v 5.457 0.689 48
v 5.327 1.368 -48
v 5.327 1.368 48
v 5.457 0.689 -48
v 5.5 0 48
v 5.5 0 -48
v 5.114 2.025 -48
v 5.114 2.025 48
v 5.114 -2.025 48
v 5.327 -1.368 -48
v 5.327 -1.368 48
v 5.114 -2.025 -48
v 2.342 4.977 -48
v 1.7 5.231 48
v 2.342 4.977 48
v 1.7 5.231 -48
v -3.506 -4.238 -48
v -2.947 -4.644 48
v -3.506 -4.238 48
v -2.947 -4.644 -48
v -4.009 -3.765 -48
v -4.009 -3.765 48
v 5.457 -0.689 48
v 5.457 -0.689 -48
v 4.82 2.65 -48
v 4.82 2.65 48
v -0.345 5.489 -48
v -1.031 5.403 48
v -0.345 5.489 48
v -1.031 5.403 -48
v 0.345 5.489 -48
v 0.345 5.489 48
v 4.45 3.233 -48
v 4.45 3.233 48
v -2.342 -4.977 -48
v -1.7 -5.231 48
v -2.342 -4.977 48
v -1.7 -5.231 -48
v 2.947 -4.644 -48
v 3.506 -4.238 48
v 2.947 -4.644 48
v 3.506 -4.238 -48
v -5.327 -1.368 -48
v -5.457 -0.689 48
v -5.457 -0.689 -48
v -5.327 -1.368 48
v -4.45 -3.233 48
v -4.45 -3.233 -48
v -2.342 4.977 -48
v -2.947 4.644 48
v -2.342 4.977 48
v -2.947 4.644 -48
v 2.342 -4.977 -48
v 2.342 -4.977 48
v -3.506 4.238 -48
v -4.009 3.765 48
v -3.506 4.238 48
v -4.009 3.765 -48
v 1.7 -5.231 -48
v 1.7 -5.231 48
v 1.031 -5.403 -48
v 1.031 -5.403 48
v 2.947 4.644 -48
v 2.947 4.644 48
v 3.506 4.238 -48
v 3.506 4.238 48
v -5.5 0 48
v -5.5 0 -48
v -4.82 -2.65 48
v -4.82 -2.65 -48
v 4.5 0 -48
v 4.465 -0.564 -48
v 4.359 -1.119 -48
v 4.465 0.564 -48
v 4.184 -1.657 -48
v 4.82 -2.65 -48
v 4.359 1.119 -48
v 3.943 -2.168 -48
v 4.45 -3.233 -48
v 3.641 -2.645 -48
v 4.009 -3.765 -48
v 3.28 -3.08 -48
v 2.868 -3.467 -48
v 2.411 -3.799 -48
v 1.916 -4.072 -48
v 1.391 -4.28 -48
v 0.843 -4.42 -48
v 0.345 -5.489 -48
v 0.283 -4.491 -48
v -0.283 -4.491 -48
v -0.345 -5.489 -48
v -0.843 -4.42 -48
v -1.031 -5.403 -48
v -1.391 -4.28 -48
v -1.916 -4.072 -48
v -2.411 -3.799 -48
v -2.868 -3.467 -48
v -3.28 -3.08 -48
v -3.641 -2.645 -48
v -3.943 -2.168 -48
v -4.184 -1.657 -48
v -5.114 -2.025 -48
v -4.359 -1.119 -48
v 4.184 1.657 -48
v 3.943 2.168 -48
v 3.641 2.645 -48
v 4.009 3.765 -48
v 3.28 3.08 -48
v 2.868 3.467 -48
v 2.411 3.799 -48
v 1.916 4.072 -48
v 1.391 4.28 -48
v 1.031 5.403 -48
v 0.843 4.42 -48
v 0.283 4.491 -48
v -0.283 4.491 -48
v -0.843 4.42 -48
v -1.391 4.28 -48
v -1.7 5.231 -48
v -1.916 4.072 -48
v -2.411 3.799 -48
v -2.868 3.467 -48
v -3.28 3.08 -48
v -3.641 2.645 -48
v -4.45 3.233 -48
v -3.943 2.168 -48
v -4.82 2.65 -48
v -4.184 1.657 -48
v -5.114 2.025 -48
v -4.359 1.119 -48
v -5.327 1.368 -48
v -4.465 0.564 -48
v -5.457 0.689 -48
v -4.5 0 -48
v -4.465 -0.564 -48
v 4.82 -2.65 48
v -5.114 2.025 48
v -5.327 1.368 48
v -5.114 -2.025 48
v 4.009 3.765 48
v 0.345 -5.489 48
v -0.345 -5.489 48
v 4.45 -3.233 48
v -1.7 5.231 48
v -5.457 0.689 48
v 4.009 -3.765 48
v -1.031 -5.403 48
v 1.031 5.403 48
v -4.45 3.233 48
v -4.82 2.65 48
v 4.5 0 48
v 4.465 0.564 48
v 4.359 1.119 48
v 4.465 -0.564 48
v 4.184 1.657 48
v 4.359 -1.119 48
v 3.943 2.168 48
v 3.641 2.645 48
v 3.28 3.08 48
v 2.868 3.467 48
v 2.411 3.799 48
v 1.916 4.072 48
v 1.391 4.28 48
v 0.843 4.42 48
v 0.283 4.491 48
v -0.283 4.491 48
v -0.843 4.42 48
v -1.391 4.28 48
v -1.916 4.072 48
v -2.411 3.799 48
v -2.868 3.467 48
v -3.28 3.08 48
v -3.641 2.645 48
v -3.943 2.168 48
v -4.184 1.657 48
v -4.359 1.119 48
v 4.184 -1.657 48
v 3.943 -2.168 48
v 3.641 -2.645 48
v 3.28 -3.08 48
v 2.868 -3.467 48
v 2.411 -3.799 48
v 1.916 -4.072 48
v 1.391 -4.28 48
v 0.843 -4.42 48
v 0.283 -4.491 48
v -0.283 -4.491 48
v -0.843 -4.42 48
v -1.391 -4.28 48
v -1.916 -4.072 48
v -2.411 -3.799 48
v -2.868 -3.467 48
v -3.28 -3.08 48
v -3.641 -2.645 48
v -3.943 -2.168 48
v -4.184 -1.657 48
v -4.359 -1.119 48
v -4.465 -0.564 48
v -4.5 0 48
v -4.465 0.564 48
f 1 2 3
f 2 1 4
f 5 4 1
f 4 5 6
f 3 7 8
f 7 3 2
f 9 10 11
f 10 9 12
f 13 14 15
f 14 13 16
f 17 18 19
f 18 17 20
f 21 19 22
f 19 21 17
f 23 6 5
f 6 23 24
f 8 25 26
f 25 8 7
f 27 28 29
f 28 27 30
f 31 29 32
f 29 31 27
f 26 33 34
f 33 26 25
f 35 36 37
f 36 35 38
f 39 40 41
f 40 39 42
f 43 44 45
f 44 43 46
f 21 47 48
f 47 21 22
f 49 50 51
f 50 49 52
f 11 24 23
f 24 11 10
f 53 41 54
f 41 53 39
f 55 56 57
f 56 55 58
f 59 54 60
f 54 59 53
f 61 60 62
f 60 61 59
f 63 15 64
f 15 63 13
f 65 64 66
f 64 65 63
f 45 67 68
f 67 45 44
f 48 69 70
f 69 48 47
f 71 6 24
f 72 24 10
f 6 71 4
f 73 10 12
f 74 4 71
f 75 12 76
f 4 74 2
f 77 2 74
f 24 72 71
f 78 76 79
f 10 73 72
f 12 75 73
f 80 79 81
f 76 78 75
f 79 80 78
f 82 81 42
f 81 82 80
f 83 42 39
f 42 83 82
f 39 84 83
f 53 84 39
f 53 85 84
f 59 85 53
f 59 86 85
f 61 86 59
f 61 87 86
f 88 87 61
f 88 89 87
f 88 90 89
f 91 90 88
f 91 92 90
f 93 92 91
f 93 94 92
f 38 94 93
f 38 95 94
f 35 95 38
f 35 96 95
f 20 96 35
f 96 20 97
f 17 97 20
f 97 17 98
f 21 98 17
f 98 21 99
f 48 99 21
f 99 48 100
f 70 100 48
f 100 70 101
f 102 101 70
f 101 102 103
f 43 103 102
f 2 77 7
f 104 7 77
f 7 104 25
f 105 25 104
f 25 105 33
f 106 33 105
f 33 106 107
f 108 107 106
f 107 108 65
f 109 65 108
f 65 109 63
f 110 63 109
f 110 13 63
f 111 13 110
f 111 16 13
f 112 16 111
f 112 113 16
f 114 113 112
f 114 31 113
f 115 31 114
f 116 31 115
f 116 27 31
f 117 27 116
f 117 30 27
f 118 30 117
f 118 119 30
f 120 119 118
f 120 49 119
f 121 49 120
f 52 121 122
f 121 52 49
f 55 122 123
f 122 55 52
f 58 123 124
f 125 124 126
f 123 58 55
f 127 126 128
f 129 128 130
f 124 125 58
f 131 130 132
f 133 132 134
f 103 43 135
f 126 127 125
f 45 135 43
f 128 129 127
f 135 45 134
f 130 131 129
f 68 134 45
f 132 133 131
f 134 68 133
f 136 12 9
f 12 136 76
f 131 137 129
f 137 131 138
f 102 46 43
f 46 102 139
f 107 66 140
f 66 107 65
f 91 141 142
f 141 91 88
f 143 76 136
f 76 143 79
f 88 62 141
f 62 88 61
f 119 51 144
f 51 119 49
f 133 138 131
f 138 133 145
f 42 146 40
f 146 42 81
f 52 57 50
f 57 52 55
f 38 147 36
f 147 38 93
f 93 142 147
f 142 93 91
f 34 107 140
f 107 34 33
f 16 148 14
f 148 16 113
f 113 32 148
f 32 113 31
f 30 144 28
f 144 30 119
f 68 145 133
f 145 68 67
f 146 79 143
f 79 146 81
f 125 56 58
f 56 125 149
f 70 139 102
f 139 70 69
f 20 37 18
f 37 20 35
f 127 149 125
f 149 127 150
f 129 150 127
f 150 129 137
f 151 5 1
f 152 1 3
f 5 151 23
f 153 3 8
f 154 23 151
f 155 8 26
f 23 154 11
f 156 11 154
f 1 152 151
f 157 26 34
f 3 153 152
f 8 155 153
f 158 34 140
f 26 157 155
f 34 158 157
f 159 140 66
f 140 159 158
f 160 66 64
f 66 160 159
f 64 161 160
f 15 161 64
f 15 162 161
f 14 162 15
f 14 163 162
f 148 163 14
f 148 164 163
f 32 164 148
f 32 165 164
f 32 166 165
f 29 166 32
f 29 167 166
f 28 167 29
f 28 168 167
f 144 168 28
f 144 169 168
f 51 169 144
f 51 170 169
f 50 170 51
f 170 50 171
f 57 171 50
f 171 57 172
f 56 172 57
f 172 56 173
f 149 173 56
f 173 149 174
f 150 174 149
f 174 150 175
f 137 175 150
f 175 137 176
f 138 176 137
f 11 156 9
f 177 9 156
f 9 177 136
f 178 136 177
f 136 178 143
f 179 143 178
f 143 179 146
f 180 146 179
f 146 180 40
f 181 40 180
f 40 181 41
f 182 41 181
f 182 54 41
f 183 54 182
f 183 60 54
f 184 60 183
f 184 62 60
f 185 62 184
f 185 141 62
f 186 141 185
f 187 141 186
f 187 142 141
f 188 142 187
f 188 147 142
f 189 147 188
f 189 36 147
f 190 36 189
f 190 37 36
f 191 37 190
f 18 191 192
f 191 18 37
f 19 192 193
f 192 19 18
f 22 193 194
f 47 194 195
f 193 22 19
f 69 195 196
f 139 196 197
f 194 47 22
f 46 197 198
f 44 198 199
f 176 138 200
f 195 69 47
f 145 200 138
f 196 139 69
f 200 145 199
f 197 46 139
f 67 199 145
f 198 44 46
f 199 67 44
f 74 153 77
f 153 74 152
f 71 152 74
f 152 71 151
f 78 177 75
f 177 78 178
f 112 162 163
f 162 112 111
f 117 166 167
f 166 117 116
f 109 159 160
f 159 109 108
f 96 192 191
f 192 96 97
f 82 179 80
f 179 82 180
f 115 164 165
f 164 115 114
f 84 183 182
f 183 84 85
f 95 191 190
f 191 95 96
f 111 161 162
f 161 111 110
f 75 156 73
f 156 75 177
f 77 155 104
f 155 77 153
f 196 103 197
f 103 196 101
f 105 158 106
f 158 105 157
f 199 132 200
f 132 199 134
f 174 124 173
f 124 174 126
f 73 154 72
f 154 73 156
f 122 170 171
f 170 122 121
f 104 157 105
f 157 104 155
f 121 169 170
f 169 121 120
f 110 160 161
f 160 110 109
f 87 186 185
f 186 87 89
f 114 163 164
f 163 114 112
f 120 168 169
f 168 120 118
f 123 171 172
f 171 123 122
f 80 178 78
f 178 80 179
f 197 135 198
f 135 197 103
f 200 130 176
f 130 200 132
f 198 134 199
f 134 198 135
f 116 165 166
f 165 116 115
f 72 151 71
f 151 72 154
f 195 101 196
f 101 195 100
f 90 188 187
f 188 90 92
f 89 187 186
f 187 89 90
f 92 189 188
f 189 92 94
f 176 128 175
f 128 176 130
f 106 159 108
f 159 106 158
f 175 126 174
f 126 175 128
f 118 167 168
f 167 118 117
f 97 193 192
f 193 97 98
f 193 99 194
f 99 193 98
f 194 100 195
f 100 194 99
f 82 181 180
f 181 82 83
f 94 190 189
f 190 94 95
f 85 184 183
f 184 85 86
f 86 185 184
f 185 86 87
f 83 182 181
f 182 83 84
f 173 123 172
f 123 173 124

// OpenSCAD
$fn = 50;


difference() {
	union() {
		translate(v = [0, 0, -48.0000000000]) {
			cylinder(h = 96, r = 5.5000000000);
		}
	}
	union() {
		translate(v = [0, 0, -100.0000000000]) {
			cylinder(h = 200, r = 4.5000000000);
		}
	}
}
